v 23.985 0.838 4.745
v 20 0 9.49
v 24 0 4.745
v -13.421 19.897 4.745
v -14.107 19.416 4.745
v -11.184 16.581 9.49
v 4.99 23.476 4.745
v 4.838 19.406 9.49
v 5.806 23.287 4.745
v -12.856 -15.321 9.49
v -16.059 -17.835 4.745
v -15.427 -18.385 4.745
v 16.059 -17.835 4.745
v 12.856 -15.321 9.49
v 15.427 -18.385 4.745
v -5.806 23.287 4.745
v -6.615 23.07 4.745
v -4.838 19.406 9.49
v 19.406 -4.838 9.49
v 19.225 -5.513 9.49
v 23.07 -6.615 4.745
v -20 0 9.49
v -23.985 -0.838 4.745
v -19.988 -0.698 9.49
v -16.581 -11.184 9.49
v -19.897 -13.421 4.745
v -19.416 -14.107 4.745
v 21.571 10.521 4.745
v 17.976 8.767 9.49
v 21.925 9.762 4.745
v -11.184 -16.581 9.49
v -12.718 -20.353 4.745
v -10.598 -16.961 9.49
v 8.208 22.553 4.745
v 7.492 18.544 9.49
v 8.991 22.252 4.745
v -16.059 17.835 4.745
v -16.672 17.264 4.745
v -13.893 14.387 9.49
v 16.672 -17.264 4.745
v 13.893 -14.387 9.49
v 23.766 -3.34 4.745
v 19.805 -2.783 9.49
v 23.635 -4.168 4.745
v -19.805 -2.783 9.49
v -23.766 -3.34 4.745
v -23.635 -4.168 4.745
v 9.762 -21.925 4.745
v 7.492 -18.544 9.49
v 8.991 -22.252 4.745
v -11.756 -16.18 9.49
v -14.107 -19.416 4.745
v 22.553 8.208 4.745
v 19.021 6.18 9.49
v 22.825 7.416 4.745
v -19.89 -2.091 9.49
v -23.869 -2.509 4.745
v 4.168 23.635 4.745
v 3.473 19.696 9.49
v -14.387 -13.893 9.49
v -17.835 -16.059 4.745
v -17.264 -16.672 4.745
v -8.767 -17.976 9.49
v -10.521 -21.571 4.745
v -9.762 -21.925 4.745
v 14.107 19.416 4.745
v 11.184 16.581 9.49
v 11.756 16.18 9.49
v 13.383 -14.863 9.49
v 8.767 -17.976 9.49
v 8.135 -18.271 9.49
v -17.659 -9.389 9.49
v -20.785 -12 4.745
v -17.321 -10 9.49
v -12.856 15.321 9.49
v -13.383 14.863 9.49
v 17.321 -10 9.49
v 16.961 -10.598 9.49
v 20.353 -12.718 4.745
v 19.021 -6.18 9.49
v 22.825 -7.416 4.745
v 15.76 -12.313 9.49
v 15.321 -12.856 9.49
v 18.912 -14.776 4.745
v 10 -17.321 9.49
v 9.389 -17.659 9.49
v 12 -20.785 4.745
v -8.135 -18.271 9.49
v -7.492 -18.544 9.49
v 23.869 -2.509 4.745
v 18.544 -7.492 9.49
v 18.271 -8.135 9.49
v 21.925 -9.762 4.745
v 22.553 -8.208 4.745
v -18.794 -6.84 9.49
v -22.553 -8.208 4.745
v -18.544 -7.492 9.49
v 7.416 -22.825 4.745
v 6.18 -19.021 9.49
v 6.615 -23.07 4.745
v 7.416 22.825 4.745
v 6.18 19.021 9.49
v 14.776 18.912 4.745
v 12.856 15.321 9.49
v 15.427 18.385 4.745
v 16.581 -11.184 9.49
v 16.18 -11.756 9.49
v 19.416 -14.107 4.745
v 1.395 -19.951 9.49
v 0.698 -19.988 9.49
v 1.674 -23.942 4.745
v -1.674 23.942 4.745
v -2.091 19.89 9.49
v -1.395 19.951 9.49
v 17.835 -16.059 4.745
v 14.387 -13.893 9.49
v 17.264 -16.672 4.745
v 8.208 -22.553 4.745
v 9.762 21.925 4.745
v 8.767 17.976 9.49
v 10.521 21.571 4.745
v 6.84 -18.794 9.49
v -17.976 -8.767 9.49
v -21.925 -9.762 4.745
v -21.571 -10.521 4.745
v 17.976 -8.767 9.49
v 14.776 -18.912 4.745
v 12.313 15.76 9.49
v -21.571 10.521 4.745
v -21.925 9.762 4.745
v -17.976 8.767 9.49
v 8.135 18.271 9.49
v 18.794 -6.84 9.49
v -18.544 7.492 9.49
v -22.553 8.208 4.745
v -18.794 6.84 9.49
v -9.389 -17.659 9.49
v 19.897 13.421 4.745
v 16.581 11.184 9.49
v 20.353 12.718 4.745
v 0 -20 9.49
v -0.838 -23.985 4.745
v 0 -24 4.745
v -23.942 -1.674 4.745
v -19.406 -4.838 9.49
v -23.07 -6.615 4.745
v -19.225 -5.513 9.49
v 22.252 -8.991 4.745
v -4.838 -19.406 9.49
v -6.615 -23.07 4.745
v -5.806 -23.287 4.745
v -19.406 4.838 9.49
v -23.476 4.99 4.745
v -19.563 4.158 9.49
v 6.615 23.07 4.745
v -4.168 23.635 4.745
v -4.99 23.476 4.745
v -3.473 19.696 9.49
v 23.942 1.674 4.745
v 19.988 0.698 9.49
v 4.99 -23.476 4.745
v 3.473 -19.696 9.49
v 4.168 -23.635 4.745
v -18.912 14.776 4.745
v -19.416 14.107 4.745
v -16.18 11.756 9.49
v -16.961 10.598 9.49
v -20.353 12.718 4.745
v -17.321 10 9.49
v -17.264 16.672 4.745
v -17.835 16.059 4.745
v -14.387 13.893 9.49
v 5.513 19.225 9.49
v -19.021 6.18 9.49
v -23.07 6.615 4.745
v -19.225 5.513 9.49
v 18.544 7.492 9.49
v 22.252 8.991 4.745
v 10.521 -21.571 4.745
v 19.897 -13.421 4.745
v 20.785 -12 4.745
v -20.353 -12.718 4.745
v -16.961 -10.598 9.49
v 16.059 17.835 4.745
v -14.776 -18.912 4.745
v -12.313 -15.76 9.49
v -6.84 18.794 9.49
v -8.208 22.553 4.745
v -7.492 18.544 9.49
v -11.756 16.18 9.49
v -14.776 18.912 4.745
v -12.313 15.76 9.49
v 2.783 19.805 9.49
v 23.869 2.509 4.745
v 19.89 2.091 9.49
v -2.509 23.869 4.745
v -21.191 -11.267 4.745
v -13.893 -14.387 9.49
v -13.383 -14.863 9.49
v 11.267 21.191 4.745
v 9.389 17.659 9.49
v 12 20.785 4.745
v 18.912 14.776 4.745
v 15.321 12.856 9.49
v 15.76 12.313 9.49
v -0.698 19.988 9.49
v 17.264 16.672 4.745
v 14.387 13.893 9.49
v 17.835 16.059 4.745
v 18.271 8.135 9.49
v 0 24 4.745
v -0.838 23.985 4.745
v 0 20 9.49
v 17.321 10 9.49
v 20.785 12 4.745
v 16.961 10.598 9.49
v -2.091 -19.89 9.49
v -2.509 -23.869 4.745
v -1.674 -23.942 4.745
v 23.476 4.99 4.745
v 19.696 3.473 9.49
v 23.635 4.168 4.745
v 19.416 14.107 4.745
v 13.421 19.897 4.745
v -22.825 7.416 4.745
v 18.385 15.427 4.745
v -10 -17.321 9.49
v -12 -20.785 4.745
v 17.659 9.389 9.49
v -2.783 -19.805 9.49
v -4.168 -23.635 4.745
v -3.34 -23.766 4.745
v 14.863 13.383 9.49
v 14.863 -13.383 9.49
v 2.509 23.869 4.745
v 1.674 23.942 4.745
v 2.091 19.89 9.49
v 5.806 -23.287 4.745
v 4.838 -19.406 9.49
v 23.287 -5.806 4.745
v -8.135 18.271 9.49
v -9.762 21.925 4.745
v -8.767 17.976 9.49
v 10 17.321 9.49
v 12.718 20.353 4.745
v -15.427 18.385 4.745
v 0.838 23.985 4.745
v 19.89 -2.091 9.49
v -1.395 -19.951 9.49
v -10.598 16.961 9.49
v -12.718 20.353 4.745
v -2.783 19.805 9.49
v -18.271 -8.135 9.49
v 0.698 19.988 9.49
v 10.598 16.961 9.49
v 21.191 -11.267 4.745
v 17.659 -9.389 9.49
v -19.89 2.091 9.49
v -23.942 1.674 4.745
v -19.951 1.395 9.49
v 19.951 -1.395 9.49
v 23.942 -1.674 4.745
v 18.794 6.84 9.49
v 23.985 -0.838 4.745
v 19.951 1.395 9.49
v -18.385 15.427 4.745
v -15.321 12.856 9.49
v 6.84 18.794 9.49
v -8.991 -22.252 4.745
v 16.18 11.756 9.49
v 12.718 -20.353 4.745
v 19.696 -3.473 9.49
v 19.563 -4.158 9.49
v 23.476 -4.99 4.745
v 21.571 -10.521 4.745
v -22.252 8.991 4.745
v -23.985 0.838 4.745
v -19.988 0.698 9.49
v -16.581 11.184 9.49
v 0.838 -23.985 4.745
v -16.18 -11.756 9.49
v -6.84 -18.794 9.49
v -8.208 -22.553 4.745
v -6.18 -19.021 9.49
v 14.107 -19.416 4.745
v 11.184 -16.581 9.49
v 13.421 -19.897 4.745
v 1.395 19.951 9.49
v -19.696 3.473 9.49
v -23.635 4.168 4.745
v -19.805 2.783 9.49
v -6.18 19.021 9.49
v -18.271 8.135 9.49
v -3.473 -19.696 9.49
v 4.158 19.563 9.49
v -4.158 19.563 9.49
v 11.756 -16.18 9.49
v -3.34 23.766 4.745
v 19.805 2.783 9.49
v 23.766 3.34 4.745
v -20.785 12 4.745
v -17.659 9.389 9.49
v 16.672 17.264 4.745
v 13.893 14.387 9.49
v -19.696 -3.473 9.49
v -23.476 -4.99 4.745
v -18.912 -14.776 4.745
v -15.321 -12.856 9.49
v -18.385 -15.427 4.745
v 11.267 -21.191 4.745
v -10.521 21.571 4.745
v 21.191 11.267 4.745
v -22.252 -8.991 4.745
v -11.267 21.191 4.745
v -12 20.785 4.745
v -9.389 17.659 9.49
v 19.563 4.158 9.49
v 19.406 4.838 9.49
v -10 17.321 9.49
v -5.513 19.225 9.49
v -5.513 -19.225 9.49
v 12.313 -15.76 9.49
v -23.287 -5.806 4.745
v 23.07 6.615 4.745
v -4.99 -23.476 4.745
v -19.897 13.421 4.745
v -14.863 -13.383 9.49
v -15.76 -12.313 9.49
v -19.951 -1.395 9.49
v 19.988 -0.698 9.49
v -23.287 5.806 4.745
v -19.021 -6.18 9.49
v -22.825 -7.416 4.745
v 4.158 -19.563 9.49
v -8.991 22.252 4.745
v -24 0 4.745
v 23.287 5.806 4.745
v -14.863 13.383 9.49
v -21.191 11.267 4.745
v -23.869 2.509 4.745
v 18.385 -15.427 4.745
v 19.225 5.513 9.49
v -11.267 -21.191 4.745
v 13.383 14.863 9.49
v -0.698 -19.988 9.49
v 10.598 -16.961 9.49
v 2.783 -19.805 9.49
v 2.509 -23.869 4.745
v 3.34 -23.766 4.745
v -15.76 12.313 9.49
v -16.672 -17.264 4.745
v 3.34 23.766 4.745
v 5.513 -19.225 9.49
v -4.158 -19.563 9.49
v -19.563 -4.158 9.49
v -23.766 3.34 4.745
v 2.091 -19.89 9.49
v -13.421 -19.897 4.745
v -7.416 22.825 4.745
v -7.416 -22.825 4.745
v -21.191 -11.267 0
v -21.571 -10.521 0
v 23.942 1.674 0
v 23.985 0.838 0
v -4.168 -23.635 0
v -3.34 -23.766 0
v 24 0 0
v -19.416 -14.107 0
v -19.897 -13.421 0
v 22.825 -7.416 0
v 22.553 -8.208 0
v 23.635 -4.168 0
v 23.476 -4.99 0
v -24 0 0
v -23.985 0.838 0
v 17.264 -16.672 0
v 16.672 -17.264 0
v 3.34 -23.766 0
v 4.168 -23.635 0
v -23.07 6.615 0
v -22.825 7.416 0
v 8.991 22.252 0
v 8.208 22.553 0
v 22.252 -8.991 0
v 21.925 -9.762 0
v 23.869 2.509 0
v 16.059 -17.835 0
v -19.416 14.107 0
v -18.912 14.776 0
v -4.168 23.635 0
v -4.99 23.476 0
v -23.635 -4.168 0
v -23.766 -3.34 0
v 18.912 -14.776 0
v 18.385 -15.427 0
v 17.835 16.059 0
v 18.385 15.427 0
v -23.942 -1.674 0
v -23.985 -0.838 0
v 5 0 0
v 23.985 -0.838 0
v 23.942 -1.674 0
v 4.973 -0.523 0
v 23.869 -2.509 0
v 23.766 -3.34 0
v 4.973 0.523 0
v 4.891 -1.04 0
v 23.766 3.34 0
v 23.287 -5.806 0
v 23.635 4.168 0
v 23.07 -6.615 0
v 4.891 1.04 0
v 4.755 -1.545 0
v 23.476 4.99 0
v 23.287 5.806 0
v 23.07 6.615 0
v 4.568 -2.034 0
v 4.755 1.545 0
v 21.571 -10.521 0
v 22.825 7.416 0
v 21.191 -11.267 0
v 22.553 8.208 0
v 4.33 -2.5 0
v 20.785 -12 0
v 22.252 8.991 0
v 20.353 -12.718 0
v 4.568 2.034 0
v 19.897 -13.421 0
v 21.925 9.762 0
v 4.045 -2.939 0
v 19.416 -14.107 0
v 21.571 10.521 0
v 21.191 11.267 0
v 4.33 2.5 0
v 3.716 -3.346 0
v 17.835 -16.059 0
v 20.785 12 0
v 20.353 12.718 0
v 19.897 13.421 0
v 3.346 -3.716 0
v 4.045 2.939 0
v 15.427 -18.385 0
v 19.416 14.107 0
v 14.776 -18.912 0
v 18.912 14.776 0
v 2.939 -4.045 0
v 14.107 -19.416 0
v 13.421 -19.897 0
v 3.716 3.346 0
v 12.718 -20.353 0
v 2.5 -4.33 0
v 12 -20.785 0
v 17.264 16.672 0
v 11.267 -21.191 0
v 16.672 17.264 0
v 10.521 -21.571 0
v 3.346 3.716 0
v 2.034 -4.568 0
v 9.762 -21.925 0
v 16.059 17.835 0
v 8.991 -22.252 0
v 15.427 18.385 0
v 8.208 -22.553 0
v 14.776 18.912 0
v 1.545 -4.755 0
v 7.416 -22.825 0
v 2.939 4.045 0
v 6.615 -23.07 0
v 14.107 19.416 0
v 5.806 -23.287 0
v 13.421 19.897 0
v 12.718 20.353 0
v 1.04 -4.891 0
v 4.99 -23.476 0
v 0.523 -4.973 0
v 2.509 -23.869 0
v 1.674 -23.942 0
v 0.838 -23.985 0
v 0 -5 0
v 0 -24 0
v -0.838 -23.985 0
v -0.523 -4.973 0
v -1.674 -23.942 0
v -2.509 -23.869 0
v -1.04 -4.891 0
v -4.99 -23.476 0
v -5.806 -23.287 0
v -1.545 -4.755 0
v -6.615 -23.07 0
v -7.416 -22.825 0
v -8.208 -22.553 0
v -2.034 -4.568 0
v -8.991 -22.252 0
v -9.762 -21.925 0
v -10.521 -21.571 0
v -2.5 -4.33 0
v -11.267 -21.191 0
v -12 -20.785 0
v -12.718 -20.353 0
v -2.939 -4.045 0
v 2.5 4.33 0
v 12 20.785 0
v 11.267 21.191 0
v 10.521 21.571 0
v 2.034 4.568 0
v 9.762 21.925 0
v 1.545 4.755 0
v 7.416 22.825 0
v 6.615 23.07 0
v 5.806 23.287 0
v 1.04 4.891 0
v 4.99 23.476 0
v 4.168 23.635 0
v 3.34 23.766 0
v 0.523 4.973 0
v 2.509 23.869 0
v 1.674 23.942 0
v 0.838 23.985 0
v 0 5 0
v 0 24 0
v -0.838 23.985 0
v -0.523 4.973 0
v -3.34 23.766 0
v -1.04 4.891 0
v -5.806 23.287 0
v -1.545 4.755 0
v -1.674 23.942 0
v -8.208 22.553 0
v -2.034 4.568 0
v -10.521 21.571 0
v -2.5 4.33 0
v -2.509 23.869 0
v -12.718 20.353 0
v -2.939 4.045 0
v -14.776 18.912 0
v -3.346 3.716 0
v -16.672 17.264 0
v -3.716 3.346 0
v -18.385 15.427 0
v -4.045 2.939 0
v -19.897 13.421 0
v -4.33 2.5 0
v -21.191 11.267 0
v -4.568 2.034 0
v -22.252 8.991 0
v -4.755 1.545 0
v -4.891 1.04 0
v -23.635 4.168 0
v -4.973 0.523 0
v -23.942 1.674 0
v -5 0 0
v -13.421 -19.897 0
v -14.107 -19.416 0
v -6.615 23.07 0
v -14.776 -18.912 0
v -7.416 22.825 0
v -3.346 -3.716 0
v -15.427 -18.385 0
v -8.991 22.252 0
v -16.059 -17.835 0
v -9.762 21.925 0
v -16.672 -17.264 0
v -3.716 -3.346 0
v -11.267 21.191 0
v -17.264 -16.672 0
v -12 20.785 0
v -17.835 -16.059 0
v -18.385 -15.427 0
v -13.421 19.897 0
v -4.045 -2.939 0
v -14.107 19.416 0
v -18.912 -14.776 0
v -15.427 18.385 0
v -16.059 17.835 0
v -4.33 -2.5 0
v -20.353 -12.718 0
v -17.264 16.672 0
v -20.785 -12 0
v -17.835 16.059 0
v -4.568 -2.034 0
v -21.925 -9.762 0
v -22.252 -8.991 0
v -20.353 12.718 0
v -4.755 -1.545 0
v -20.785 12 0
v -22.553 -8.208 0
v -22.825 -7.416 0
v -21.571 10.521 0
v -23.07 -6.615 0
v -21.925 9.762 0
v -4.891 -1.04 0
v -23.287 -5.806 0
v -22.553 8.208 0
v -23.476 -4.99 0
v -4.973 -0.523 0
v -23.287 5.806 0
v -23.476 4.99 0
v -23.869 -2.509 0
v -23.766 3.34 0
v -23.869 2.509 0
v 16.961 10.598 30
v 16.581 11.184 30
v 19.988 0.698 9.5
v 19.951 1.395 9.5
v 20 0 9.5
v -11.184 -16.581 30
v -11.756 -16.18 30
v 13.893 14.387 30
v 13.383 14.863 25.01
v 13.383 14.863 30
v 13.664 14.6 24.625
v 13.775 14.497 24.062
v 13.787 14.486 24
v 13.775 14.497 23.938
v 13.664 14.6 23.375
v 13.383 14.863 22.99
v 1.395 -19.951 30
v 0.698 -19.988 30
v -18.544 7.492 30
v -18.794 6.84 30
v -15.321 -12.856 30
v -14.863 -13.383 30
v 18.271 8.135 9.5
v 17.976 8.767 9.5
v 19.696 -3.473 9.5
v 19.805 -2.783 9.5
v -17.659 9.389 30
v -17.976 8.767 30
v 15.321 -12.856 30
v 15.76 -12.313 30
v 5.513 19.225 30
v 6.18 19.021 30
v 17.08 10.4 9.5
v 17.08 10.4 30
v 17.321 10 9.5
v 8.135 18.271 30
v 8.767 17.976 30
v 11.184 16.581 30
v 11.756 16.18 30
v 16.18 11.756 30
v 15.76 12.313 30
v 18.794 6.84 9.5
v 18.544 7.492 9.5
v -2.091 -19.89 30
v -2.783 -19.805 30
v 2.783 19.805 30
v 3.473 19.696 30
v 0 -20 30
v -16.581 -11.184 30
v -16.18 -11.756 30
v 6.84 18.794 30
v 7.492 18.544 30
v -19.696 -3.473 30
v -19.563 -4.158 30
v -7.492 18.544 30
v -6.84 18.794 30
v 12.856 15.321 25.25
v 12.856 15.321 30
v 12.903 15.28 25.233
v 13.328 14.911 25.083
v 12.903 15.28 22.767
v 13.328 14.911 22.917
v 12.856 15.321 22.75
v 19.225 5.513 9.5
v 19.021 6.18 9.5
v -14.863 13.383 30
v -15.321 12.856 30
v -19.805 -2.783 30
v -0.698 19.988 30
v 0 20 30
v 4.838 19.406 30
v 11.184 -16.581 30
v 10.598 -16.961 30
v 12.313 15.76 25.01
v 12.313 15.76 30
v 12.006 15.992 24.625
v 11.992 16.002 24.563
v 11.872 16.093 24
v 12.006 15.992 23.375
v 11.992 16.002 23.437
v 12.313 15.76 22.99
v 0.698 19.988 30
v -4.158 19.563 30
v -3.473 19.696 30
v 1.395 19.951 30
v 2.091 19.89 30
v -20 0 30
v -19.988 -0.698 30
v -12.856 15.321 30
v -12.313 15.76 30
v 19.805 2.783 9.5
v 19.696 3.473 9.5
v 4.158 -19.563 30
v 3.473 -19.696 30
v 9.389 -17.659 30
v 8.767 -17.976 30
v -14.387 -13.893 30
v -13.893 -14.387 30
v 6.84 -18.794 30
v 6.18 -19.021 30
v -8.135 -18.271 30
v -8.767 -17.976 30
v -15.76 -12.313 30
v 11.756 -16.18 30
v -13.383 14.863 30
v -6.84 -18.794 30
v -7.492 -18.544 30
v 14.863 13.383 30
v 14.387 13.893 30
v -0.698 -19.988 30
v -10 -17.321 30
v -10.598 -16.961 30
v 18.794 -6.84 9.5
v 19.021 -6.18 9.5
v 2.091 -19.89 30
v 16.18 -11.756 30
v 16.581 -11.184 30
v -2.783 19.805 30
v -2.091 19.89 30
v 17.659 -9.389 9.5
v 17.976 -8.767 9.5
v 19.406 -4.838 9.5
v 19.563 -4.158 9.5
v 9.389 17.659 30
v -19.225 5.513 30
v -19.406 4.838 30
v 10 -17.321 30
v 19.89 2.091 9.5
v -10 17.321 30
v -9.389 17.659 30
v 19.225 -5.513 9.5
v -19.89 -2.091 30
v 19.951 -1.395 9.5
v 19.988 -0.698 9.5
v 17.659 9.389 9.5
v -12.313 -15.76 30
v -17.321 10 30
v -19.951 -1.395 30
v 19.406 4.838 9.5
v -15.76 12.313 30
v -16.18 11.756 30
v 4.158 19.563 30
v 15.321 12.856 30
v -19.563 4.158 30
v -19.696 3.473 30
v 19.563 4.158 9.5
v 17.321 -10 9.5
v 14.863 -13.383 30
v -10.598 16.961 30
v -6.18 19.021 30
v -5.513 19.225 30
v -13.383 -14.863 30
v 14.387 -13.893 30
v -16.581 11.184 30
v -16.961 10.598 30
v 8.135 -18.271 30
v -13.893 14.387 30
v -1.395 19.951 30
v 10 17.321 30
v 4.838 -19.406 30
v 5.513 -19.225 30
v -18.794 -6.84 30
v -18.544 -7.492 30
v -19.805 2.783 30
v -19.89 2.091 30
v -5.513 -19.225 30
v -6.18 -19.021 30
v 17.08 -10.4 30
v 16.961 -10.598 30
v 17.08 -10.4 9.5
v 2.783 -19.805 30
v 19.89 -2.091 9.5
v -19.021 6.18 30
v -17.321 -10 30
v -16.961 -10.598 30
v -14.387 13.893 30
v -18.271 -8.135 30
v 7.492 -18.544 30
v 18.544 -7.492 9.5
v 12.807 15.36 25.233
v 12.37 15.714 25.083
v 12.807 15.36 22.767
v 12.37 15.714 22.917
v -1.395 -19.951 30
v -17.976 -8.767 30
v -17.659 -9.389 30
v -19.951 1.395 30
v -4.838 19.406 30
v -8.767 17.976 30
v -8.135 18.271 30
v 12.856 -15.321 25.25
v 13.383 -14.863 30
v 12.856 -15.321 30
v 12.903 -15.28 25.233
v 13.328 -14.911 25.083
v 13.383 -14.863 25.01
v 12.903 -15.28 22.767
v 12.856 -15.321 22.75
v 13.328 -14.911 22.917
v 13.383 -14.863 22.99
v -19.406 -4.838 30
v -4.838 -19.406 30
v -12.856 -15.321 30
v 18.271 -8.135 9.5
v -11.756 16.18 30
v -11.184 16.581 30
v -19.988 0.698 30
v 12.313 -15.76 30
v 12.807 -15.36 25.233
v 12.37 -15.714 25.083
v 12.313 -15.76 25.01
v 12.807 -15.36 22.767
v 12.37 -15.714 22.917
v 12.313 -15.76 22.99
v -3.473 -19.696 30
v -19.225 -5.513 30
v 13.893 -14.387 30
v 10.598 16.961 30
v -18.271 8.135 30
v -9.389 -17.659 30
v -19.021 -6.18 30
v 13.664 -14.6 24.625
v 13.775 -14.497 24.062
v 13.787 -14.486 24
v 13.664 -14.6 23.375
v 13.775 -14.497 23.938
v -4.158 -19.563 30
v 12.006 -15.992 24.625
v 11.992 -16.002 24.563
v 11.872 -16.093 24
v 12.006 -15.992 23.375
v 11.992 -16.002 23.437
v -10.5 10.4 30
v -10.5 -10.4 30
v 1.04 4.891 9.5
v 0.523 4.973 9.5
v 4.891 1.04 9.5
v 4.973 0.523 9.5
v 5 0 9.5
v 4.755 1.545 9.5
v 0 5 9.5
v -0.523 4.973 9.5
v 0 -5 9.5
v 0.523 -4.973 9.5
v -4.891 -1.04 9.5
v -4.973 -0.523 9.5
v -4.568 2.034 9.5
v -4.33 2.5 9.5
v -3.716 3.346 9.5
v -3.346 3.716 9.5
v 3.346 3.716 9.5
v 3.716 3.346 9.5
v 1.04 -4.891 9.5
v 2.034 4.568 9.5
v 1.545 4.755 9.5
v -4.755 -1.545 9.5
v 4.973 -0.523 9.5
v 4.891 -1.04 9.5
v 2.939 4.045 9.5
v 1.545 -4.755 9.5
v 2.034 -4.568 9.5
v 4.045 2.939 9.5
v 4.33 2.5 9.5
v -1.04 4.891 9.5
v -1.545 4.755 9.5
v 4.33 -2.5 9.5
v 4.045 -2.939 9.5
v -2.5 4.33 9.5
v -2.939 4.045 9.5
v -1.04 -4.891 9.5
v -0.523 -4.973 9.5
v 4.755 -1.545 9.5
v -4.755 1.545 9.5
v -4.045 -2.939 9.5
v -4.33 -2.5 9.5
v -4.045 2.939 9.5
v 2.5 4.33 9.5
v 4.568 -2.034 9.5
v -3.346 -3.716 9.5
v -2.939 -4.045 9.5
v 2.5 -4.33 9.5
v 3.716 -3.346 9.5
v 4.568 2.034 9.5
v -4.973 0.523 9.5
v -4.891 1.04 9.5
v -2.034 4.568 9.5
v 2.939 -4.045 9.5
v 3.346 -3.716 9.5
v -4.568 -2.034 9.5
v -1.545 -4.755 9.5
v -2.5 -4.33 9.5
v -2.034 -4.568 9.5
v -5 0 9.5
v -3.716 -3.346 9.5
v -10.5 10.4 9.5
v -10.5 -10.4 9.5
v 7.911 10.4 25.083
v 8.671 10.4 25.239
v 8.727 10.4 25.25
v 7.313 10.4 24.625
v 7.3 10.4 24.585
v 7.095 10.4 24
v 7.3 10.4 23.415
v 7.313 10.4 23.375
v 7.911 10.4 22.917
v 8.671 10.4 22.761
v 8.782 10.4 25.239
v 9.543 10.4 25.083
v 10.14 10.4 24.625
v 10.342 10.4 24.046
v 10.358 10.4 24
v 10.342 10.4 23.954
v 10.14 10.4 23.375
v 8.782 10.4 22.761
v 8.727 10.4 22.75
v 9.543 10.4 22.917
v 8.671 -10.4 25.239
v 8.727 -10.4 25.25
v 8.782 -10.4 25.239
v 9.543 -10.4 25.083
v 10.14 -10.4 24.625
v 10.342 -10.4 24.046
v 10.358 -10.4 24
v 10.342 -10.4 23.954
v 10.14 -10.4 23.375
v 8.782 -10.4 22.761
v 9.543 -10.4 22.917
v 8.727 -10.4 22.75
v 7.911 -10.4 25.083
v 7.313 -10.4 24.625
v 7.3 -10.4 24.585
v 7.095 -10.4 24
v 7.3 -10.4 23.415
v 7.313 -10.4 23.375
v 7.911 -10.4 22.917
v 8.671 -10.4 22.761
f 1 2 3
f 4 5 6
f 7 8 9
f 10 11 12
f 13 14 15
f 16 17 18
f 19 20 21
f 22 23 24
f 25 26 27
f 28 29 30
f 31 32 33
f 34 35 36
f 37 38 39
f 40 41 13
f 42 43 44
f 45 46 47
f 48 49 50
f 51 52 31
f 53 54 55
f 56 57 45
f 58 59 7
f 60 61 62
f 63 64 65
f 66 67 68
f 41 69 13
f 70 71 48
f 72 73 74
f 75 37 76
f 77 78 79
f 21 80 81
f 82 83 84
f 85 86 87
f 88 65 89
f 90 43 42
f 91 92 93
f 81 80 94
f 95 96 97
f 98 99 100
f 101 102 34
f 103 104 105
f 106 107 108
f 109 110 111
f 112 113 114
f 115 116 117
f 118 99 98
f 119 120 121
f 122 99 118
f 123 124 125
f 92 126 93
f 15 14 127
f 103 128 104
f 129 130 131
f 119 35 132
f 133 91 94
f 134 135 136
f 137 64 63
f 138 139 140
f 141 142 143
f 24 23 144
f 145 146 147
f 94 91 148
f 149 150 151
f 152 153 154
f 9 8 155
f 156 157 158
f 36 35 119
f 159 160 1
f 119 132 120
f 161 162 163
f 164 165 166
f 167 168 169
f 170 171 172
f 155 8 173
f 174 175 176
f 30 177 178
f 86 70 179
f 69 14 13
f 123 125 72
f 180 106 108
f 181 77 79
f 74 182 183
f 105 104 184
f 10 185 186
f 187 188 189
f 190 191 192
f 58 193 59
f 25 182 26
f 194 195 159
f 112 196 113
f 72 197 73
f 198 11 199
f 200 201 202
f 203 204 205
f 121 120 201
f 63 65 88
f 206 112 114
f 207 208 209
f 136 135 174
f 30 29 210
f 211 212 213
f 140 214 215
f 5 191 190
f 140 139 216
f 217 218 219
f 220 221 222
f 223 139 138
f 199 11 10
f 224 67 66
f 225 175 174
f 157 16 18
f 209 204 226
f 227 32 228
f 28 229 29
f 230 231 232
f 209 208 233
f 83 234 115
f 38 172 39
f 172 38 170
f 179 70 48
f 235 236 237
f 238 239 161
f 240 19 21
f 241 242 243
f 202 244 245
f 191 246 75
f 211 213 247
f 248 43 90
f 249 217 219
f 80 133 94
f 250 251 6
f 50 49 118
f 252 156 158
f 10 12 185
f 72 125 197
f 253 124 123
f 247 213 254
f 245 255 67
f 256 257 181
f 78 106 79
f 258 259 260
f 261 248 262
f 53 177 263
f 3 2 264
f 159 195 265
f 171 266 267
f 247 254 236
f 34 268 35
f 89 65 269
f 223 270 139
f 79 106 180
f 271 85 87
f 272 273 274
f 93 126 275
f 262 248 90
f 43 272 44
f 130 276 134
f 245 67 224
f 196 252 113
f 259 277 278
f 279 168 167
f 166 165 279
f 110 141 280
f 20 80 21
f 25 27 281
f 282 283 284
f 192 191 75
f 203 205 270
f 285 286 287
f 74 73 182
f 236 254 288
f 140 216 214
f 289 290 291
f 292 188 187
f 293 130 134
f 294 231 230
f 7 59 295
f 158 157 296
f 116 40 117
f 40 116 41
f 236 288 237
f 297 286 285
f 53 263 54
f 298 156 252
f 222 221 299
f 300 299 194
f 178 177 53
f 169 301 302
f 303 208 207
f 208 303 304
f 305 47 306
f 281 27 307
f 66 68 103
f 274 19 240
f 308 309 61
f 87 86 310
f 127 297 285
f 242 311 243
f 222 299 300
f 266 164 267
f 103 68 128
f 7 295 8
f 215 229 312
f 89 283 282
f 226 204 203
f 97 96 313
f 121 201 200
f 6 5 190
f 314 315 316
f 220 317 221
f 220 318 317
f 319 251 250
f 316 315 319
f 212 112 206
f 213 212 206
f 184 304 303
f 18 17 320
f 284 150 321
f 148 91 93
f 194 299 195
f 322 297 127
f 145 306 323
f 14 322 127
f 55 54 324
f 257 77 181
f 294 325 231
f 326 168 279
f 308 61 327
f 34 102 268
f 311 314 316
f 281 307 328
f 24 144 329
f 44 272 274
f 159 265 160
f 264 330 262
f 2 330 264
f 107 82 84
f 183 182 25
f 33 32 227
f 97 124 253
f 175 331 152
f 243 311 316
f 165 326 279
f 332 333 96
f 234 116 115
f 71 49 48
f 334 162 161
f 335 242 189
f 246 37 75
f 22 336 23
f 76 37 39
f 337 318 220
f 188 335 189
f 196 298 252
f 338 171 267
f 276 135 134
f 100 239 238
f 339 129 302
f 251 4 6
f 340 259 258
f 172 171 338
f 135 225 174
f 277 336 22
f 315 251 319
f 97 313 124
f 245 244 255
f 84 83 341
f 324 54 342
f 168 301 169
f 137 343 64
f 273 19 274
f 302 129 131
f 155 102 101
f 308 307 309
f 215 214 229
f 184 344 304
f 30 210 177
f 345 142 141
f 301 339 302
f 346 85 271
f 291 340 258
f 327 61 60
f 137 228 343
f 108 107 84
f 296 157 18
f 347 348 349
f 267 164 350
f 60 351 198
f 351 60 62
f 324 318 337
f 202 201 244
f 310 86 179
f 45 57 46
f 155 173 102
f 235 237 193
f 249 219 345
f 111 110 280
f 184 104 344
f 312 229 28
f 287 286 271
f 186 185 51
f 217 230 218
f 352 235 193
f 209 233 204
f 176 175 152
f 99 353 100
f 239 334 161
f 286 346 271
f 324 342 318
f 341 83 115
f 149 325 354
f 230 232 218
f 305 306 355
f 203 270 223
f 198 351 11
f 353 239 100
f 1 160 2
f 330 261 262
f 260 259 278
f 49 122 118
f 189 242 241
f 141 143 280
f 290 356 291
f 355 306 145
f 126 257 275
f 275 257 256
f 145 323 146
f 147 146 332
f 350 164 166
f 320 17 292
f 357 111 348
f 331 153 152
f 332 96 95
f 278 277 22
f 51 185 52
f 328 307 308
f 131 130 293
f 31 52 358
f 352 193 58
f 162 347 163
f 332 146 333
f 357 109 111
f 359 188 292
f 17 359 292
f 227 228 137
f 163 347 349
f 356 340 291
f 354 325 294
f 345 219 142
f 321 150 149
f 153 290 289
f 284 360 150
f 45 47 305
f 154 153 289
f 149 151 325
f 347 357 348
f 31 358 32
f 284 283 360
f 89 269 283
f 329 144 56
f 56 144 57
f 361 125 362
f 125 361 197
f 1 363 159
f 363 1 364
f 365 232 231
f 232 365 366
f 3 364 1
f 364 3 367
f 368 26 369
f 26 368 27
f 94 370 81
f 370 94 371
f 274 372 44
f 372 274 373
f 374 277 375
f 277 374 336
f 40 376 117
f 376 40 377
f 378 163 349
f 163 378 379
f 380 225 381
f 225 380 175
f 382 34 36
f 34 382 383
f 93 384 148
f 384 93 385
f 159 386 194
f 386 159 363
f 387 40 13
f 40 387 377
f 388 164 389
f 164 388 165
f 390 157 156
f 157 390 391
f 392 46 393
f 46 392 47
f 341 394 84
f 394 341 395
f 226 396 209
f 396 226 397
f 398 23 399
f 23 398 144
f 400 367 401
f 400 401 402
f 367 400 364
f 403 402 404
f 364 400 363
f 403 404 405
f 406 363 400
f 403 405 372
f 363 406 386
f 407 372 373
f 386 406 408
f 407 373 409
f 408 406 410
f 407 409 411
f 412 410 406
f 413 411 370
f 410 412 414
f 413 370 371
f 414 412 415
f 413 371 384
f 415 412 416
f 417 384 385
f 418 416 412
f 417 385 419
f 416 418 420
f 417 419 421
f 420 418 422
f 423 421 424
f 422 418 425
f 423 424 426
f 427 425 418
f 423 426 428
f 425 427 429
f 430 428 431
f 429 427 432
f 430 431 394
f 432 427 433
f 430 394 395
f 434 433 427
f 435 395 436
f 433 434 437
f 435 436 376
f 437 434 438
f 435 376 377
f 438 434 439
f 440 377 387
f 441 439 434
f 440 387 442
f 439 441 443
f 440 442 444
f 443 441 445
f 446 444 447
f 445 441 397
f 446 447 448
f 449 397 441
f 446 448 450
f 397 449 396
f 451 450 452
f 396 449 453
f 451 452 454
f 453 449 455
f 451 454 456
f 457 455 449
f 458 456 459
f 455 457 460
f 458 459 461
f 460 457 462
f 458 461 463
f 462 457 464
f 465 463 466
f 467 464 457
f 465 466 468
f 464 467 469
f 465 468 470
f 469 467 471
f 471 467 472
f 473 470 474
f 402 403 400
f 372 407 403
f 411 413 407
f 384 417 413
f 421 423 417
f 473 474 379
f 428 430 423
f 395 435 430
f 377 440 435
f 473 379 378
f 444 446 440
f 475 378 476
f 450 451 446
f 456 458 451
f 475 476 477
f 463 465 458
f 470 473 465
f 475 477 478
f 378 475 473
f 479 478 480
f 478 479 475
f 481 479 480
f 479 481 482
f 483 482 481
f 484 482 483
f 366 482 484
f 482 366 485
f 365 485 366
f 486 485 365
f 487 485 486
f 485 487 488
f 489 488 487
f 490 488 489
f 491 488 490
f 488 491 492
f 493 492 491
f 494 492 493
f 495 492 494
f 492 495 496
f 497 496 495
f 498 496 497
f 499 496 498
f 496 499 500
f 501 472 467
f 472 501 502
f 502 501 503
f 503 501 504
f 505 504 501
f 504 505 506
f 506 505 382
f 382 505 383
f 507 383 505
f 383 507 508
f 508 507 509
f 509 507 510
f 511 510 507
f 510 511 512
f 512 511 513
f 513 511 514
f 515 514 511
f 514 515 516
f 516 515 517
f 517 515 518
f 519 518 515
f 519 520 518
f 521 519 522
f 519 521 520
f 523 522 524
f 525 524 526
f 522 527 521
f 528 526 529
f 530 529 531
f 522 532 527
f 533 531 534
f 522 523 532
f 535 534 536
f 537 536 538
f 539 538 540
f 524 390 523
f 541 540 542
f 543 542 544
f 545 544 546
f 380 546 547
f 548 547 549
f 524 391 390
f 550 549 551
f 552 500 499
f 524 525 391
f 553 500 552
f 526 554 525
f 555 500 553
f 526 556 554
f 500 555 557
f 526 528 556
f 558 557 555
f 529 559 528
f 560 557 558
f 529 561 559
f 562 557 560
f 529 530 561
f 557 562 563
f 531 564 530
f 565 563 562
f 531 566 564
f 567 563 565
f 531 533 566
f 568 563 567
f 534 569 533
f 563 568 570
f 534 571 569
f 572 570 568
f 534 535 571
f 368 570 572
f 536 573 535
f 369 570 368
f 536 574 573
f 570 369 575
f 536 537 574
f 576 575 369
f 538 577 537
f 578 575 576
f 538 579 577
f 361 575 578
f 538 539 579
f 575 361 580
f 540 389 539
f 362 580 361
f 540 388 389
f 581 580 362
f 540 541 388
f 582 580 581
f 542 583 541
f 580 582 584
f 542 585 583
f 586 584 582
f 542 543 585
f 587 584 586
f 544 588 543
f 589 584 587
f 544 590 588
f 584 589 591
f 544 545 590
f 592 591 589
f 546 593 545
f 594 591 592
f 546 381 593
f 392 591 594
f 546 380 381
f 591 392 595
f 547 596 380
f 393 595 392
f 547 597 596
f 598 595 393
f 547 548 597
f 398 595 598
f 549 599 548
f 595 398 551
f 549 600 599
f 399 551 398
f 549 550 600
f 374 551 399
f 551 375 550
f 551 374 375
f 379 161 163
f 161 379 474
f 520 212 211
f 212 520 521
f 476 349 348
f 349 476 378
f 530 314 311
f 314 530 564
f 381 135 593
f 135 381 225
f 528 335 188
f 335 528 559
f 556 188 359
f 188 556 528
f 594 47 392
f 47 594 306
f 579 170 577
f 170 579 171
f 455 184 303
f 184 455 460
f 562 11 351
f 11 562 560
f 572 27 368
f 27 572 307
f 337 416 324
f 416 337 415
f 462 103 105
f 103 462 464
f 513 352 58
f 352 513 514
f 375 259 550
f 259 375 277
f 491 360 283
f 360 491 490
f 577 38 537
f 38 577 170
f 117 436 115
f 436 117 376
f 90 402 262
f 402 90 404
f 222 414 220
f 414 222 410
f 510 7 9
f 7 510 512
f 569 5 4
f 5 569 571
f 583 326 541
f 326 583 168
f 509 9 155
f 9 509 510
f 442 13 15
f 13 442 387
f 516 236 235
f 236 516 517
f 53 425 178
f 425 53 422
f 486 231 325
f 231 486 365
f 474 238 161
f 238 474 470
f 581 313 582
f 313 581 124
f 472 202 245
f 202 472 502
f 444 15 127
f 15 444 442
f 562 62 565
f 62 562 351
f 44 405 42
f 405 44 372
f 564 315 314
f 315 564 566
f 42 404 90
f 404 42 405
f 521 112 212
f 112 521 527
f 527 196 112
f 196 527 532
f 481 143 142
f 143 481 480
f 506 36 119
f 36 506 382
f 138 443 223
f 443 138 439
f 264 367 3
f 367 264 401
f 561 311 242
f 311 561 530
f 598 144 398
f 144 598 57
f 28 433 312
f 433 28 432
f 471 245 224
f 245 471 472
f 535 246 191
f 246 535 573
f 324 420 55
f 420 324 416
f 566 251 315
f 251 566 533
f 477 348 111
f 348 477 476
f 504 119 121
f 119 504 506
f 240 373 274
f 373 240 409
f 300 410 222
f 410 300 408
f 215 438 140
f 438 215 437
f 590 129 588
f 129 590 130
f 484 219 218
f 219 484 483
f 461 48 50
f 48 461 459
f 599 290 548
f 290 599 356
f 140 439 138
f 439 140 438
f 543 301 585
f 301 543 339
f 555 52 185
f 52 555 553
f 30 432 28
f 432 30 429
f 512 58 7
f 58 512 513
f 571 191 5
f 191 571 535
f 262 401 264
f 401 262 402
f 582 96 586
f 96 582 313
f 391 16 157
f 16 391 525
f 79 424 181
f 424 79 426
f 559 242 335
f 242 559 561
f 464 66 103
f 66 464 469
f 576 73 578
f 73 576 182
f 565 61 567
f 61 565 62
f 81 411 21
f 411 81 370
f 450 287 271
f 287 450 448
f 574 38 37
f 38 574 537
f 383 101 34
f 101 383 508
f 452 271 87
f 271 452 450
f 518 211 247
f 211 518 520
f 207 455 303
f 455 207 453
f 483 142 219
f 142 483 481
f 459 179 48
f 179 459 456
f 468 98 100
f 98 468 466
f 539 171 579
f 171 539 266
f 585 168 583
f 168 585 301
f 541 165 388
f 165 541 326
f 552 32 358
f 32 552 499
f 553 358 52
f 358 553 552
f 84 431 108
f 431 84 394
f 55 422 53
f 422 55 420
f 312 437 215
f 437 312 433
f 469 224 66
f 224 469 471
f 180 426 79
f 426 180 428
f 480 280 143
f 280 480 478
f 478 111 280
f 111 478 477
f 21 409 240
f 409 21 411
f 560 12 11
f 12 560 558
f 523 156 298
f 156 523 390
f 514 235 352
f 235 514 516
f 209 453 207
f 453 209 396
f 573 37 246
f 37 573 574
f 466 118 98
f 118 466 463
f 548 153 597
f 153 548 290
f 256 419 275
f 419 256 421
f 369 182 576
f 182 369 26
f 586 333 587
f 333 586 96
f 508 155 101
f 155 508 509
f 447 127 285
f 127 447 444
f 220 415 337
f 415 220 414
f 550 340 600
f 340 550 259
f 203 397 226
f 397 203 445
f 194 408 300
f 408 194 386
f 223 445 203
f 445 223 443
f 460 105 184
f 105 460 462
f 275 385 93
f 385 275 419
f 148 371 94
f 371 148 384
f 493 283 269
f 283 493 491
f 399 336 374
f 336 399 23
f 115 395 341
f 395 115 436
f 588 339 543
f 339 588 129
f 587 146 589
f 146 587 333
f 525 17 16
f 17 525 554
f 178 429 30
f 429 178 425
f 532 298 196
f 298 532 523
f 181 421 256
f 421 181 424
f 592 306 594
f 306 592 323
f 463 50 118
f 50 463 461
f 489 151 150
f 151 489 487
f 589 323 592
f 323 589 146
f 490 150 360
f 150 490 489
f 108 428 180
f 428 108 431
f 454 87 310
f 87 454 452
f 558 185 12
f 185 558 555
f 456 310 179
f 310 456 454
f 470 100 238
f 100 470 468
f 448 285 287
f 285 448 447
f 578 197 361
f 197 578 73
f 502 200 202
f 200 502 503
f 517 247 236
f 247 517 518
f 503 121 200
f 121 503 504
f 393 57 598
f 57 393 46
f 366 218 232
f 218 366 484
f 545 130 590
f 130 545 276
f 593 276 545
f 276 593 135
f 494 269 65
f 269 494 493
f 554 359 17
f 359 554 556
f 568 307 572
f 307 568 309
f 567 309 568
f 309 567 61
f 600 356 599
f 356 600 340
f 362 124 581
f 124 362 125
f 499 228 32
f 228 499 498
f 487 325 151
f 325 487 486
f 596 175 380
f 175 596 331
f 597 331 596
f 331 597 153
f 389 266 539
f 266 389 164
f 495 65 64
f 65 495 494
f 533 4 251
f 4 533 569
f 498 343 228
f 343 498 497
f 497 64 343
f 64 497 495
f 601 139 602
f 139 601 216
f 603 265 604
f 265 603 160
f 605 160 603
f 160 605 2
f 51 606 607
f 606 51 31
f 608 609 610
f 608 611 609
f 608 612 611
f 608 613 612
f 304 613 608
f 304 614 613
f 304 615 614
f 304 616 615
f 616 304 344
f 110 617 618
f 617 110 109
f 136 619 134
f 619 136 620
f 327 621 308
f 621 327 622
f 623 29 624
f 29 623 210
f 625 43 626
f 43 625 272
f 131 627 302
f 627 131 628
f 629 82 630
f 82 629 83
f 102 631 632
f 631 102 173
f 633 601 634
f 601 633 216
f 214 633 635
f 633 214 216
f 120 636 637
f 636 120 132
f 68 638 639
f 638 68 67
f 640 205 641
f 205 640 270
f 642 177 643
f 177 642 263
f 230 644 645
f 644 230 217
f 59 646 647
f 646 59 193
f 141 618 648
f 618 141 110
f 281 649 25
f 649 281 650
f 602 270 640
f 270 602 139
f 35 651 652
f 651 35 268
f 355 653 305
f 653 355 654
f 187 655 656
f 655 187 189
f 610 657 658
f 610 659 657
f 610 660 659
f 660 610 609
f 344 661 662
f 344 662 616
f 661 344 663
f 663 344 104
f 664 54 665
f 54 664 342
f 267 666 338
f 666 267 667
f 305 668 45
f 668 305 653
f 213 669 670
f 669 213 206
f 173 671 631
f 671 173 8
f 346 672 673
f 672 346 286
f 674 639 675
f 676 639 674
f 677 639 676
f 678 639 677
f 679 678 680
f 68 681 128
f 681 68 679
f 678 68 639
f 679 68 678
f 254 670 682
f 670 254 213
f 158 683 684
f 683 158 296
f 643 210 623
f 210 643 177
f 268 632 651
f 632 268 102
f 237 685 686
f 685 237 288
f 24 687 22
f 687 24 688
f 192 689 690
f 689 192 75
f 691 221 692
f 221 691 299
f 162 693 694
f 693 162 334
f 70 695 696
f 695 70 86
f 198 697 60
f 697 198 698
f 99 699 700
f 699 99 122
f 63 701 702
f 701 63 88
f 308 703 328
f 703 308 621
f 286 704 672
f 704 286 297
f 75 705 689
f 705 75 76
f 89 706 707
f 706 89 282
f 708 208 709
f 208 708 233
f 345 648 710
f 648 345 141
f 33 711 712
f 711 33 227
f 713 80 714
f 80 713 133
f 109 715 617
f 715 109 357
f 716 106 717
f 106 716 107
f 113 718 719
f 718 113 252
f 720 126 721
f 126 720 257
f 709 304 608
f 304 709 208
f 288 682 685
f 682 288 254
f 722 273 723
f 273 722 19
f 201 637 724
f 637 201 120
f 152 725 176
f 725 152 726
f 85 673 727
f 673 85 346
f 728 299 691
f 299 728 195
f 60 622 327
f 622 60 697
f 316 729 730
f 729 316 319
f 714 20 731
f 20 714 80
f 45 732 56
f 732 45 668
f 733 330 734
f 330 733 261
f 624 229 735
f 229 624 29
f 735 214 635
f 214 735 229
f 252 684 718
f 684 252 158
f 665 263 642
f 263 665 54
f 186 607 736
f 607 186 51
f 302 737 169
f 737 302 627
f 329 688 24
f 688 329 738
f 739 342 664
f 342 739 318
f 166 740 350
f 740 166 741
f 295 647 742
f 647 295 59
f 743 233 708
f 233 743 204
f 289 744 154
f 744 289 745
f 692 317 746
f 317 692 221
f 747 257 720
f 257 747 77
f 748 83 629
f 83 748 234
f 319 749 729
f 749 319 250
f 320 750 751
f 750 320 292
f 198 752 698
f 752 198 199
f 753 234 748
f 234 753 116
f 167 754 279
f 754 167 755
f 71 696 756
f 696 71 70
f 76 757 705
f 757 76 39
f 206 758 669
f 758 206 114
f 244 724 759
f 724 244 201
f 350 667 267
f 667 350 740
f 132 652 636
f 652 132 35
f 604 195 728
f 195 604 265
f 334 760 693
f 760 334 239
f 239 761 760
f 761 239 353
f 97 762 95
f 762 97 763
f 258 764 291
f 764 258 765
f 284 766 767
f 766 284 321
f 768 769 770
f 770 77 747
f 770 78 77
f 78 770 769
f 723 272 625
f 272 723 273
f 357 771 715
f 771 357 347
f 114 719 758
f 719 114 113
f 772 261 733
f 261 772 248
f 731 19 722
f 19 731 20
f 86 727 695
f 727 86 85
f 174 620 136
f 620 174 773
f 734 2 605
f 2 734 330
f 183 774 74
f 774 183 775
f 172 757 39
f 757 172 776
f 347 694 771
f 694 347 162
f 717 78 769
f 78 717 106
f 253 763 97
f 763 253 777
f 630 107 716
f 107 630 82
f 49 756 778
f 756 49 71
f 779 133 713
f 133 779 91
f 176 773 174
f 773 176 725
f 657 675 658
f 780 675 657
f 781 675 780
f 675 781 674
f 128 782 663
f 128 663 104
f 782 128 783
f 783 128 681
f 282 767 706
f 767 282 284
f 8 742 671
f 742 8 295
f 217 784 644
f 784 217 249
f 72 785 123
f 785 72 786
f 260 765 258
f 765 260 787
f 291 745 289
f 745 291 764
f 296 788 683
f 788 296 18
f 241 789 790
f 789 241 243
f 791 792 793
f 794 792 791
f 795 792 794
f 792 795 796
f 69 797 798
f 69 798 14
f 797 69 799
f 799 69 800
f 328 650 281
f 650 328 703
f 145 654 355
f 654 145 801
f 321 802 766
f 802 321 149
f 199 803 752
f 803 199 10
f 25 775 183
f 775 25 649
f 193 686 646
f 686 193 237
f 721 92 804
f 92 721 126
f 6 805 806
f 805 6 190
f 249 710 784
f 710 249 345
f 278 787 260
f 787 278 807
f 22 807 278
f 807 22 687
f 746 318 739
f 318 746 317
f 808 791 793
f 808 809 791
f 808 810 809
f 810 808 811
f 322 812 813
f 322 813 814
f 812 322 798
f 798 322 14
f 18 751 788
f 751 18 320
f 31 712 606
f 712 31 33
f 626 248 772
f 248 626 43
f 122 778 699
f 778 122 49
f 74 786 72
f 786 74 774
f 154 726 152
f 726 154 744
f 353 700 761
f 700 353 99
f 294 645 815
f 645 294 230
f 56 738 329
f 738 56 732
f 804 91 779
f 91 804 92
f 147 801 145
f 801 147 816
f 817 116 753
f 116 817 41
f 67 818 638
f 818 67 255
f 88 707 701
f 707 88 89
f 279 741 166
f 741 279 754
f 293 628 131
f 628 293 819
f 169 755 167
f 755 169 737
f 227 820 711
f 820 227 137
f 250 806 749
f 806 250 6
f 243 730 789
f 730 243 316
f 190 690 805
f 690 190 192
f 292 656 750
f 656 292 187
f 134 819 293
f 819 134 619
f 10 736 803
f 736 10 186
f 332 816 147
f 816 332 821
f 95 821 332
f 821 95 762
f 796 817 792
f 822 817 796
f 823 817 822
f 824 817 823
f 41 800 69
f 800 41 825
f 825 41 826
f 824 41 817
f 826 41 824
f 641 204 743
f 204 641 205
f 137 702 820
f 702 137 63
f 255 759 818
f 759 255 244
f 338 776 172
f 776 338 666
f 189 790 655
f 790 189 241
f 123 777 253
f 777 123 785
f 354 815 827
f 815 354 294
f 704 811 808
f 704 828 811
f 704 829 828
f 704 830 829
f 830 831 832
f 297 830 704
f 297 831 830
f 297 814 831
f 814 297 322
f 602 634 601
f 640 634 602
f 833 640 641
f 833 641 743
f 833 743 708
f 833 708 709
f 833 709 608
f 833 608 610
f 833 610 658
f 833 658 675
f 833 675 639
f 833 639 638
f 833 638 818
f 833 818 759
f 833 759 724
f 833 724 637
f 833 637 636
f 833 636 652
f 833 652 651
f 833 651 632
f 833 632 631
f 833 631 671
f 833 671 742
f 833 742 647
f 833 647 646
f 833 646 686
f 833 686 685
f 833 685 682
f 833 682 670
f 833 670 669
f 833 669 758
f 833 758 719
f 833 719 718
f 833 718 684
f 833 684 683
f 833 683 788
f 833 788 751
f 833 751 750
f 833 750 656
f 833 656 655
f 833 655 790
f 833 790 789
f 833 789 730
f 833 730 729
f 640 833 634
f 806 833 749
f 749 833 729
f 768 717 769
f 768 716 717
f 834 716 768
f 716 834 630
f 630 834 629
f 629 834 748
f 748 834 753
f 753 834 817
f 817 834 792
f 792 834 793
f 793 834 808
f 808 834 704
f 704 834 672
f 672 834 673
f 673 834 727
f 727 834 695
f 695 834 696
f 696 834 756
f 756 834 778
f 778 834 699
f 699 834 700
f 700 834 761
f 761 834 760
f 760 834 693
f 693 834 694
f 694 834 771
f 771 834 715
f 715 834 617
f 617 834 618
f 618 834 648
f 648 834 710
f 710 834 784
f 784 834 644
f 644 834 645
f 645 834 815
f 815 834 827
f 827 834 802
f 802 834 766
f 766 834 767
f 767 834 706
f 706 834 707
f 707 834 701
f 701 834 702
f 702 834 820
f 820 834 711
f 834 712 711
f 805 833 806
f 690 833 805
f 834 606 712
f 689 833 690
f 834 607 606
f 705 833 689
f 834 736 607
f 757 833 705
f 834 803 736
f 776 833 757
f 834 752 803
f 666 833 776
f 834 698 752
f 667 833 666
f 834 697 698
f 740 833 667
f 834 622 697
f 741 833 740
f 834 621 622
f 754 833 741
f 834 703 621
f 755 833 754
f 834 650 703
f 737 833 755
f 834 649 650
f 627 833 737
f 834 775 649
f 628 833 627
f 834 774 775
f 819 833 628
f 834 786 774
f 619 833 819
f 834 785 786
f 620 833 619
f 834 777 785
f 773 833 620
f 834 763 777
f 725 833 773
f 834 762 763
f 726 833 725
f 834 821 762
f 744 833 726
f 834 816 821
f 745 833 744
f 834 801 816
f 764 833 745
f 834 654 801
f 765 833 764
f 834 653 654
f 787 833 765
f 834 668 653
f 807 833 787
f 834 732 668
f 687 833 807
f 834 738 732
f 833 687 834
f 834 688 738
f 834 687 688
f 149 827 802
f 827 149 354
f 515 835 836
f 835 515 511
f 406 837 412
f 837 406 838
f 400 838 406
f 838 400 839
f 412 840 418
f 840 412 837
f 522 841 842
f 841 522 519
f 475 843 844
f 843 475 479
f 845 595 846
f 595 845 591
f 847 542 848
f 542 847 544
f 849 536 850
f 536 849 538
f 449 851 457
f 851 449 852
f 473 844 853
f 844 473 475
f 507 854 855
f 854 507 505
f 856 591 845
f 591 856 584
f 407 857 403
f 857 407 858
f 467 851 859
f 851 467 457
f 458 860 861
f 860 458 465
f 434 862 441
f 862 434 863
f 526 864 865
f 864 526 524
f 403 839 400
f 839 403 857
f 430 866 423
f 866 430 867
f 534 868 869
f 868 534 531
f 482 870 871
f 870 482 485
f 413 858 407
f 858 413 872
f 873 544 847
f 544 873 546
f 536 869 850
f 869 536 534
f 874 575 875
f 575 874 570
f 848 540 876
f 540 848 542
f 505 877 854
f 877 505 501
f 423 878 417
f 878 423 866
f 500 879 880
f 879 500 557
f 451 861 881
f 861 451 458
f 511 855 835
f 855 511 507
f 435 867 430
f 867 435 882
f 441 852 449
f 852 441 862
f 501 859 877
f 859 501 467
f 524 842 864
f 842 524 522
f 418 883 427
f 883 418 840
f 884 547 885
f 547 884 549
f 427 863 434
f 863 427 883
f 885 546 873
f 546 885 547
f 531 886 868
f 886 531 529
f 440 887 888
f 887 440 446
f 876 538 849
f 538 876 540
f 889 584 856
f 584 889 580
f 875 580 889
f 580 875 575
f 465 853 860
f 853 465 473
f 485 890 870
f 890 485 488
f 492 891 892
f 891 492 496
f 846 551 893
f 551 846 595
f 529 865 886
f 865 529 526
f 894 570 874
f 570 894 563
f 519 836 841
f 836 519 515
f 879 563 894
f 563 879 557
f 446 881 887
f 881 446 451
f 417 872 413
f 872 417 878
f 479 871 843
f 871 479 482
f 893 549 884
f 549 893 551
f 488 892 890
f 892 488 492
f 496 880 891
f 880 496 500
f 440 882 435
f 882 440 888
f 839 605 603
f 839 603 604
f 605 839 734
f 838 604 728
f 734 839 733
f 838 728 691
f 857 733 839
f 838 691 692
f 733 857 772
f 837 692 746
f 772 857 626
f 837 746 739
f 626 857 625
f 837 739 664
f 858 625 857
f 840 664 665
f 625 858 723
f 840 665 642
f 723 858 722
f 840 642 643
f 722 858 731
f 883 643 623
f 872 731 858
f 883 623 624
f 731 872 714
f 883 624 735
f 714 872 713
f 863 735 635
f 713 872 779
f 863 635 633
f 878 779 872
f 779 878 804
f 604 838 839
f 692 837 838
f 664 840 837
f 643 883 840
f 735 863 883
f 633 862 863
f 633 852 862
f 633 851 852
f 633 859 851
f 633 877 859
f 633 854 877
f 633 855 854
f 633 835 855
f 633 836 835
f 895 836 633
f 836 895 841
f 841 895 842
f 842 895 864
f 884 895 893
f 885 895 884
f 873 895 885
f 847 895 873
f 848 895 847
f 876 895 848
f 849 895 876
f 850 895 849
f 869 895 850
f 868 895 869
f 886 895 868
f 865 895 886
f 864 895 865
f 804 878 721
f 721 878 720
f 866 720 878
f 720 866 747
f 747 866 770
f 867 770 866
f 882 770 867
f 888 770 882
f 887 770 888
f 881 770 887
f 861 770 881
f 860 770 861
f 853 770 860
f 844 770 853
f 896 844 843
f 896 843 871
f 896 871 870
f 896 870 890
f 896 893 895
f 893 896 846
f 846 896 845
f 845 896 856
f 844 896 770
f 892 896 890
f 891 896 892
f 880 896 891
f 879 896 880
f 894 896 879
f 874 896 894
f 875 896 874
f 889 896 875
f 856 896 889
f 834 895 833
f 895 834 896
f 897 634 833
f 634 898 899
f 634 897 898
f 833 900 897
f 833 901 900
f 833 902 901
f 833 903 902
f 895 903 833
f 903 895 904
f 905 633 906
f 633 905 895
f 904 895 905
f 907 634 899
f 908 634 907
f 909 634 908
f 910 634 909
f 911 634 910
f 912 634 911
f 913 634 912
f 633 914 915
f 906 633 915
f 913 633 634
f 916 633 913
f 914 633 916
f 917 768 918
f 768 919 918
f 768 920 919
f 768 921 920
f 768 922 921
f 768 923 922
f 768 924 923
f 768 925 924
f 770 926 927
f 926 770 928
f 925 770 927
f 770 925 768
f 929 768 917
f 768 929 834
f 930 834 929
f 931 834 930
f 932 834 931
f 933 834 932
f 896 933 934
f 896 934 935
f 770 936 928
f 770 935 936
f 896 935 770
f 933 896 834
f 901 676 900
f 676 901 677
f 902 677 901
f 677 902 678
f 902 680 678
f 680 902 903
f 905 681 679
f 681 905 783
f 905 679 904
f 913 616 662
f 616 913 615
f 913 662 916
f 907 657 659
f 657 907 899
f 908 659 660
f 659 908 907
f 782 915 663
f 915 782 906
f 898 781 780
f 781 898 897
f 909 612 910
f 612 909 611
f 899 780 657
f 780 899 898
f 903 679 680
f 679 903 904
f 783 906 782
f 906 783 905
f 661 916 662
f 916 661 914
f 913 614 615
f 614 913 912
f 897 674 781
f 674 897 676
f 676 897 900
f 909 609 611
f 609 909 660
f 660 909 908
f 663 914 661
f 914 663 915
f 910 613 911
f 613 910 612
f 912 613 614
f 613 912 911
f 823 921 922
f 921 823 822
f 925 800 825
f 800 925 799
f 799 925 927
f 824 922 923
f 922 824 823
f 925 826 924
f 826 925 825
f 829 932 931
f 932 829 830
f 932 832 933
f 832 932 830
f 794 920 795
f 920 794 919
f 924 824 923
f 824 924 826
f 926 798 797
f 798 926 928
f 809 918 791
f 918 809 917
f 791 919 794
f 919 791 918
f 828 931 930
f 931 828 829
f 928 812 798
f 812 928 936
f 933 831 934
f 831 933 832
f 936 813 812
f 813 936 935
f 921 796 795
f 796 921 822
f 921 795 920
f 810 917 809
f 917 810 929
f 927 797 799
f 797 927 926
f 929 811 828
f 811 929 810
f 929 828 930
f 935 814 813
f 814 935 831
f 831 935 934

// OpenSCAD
//
// a pulley for Zero Turn Mower servo
// based on a windshield motor
//

thickness    = 30.0;	  	//
diameter     = 40.0;

mountDiameter = 10.0;

screwDiameter = 2.5;
screwLength = 200.0;
screwAngle = 50.0;
screwHeight1 = 15.0;
screwHeight2 = 24.0;

leverX = 10.5 * 2;
leverY = 20.8;
leverZ = 35.0;

leverSize = [leverX,leverY,leverZ]; 

leverOffsetZ = 9.5;

cheekLowThickness    = leverOffsetZ-0.01;	  	//
cheekHighThickness    = 8.0;	  	//
cheekDiameter1    = diameter;
cheekDiameter2    = 48.0;
cheekOffset       = thickness - cheekHighThickness;


module CheekLow()
{
   union() { 
    translate([0, 0, cheekLowThickness/2]) {
        cylinder(r1=cheekDiameter2/2, r2=cheekDiameter1/2, h=cheekLowThickness/2, $fn=180);
    }
    cylinder(r=cheekDiameter2/2, h=cheekLowThickness/2, $fn=180);
   }
}

module CheekHigh()
{
	translate([0, 0, cheekOffset]) {
       union() { 
        translate([0, 0, cheekHighThickness/2]) {
            cylinder(r=cheekDiameter2/2, h=cheekHighThickness/2, $fn=180);
        }
        cylinder(r1=cheekDiameter1/2, r2=cheekDiameter2/2, h=cheekHighThickness/2, $fn=180);
       }
    }
}

module ShaftCut()
{
    translate([0, 0, -0.01]) {	
        cylinder(r=mountDiameter/2, h=thickness + 0.02, $fn=60);
    }
}

module ScrewHole(height, angle)
{
    rotate([90, 0, angle + 90]) {	
        translate([0, height, 0]) {	
            cylinder(r=screwDiameter/2, h=screwLength, $fn=12);
        }
    }
}


module PulleyBody()
{
    difference() {
        
        union() {
            cylinder(r=diameter/2,h=thickness, $fn=180);
            CheekLow();
            //CheekHigh();
        }

        ShaftCut();
    }
    
}

module LeverCut()
{
    translate([0,0,leverZ/2 + leverOffsetZ]) {
        
        cube(leverSize,center=true);
        
        translate([leverX-0.05,0,0]) {
          cube([leverX,leverY,leverZ],center=true);
        }
    }
}

module Pulley()
{
    difference() {
        PulleyBody();
        LeverCut();
        //ScrewHole(screwHeight1,screwAngle);
        ScrewHole(screwHeight2,screwAngle);
        //ScrewHole(screwHeight1,-screwAngle);
        ScrewHole(screwHeight2,-screwAngle);
    }
}

Pulley();
//LeverCut();
